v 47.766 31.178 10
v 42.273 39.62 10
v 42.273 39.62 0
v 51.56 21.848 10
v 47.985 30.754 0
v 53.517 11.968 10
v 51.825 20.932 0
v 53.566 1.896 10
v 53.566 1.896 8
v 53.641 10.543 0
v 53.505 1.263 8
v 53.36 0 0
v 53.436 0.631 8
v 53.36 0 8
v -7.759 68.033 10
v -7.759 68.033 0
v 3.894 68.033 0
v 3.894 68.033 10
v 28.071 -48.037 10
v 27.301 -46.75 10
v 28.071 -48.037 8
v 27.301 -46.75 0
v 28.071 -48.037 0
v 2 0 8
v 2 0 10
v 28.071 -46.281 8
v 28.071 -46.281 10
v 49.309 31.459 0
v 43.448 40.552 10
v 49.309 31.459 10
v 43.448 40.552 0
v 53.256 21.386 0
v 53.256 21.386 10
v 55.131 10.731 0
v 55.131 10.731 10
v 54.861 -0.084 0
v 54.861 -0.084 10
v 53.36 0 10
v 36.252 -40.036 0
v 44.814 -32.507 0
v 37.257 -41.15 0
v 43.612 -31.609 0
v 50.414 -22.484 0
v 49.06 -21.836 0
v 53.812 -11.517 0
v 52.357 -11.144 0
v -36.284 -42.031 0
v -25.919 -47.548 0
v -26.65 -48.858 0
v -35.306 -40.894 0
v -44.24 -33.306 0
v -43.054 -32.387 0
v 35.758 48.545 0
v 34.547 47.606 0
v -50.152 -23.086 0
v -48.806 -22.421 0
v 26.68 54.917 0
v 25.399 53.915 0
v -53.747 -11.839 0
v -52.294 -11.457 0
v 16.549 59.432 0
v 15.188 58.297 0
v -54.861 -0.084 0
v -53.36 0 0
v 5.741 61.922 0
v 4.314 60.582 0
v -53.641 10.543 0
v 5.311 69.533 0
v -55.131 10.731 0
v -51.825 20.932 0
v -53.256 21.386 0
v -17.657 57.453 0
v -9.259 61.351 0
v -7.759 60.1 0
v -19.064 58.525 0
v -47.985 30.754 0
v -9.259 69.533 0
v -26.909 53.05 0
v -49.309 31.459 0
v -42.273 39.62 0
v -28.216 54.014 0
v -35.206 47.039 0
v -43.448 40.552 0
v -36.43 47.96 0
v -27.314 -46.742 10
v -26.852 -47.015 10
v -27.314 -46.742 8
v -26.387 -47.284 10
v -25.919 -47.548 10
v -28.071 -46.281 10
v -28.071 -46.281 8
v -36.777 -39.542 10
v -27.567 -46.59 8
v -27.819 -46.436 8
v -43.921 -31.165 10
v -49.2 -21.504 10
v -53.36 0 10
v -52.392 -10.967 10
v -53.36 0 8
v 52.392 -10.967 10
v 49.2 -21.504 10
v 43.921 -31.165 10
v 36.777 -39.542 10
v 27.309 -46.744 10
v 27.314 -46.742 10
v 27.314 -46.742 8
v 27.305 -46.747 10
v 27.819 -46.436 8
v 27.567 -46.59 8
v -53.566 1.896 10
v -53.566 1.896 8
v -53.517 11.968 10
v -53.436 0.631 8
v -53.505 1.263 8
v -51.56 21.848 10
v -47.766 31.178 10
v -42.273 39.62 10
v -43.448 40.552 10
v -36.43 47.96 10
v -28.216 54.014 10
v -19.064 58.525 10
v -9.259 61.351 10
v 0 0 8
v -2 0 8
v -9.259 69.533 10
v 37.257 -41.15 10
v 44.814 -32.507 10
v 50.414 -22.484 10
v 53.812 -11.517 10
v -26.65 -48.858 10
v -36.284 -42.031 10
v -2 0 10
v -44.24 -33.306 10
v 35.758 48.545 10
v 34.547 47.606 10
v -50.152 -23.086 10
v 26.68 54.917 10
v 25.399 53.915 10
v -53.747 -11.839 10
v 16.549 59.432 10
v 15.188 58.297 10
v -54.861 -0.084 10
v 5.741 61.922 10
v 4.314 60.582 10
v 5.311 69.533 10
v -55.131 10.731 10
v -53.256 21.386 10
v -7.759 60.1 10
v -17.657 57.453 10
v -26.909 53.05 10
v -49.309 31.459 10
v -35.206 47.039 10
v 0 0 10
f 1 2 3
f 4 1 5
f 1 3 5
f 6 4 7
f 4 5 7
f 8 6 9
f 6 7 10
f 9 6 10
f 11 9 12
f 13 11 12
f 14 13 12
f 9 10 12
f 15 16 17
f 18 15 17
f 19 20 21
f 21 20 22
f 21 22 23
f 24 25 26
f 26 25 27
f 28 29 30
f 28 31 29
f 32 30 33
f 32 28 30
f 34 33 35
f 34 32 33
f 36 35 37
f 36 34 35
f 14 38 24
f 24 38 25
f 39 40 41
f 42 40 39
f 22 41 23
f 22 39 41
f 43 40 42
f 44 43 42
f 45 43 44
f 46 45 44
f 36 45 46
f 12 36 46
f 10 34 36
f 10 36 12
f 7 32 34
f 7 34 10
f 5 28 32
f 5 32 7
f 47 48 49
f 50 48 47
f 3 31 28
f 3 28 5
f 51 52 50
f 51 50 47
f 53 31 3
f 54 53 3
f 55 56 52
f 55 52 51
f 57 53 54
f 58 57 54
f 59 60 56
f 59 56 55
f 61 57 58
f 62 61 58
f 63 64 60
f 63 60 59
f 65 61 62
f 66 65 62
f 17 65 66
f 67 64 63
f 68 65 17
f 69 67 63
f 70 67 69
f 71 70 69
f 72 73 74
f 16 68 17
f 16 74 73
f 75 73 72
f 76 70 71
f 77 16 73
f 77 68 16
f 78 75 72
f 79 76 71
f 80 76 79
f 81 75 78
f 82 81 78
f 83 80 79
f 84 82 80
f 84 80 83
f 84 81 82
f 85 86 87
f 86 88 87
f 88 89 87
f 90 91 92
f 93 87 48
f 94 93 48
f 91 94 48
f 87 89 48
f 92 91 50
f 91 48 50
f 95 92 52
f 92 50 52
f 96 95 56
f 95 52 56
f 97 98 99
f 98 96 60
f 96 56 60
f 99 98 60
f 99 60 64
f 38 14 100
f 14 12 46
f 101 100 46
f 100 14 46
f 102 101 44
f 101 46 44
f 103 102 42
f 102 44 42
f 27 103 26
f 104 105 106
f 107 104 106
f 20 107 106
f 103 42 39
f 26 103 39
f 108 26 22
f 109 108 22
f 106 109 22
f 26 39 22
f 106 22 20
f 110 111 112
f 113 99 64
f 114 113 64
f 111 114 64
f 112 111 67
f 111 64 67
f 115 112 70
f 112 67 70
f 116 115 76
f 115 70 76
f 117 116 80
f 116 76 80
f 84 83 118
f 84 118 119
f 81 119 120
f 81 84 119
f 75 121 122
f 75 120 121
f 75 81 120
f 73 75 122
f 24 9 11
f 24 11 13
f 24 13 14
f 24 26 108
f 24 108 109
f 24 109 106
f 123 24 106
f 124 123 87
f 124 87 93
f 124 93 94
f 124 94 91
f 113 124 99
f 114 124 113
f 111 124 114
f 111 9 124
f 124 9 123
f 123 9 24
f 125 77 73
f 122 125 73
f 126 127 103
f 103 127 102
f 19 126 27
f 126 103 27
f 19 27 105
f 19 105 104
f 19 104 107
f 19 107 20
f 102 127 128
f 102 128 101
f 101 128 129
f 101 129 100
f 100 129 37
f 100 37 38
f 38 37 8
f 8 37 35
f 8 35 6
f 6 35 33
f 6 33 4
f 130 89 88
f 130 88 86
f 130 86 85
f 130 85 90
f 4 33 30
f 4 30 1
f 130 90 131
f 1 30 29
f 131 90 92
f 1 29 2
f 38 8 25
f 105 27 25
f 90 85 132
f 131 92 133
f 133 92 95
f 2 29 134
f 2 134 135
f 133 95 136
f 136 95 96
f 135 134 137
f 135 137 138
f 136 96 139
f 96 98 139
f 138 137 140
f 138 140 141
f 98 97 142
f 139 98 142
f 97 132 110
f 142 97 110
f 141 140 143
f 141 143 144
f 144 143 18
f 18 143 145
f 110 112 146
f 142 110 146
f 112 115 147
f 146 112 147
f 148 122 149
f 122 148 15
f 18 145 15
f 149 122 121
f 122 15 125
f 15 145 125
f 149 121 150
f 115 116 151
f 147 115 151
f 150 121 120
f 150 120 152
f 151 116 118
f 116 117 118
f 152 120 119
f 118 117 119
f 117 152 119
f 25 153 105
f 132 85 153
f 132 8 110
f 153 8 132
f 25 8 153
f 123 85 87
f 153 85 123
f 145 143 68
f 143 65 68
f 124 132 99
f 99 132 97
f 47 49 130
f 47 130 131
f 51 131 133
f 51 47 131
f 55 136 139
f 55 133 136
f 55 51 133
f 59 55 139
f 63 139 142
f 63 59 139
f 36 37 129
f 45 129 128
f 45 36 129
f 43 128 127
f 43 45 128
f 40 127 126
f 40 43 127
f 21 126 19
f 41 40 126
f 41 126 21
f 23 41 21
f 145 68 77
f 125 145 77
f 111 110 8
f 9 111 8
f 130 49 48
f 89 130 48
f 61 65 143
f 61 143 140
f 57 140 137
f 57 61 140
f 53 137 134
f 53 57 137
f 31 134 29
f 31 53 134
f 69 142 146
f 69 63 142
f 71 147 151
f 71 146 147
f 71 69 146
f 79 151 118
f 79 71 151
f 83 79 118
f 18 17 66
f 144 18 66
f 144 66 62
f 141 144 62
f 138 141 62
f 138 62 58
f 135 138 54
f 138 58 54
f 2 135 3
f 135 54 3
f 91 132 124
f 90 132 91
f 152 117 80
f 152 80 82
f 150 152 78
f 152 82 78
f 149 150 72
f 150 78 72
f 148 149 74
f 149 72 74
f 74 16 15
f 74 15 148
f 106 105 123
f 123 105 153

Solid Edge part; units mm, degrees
sketch "Sketch1" plane through (0, 0, 0) normal (0, 0, 1) x (1, 0, 0)
  arc A0 (-42.2727, 39.6197) -> (-53.3598, 0) centre (-0.8768, 6.6744) ccw
  arc A1 (-53.3598, 0) -> (-25.9191, -47.548) centre (0.1673, -0.8009) ccw
  line L0 (-26.65, -48.8578) -> (-25.9191, -47.548)
  arc A2 (-54.8611, -0.0838) -> (-26.65, -48.8578) centre (0.1673, -0.8009) ccw
  arc A3 (-43.4475, 40.5523) -> (-54.8611, -0.0838) centre (-0.8768, 6.6744) ccw
  arc A4 (-9.2588, 61.3508) -> (-43.4475, 40.5523) centre (1.7356, 4.7791) ccw
  line L1 (-9.2588, 69.5332) -> (-9.2588, 61.3508)
  line L2 (5.3113, 69.5332) -> (-9.2588, 69.5332)
  line L3 (5.7406, 61.9223) -> (5.3113, 69.5332)
  arc A5 (43.4475, 40.5523) -> (5.7406, 61.9223) centre (-1.7356, 4.7791) ccw
  arc A6 (54.8611, -0.0838) -> (43.4475, 40.5523) centre (0.8768, 6.6744) ccw
  arc A7 (28.0706, -48.0371) -> (54.8611, -0.0838) centre (-0.1673, -0.8009) ccw
  line L4 (27.3009, -46.7496) -> (28.0706, -48.0371)
  arc A8 (53.3598, 0) -> (27.3009, -46.7496) centre (-0.1673, -0.8009) cw
  arc A9 (42.2727, 39.6197) -> (53.3598, 0) centre (0.8768, 6.6744) cw
  arc A10 (4.3138, 60.5824) -> (42.2727, 39.6197) centre (-1.7356, 4.7791) cw
  line L5 (3.8935, 68.0332) -> (4.3138, 60.5824)
  line L6 (-7.7588, 68.0332) -> (3.8935, 68.0332)
  line L7 (-7.7588, 68.0332) -> (-7.7588, 60.1005)
  arc A11 (-7.7588, 60.1005) -> (-42.2727, 39.6197) centre (1.7356, 4.7791) ccw
extrude "Protrusion1" add sketch "Sketch1" along normal blind 10
sketch "Sketch2" plane through (0, 10.3377, 10) normal (0, 0, 1) x (0, -1, 0)
  line L0 (8.4418, -53.9965) -> (8.4418, 54.1624)
  line L1 (8.4418, 54.1624) -> (10.3377, 53.3598)
  line L2 (10.3377, 53.3598) -> (10.3377, -53.3598)
  line L3 (10.3377, -53.3598) -> (8.4418, -53.9965)
extrude "ExtrudedProtrusion_2" add sketch "Sketch2" against normal blind 2
sketch "Sketch3" plane through (0, 10.3377, 10) normal (0, 0, 1) x (0, -1, 0)
  line L0 (58.3748, 28.0706) -> (10.3377, 0)
  line L1 (10.3377, 0) -> (10.3377, 2)
  line L2 (10.3377, 2) -> (56.6184, 28.0706)
  line L3 (56.6184, 28.0706) -> (58.3748, 28.0706)
extrude "ExtrudedProtrusion_3" add sketch "Sketch3" against normal blind 2
sketch "Sketch4" plane through (0, 10.3377, 10) normal (0, 0, 1) x (0, -1, 0)
  line L0 (10.3377, -2) -> (56.6184, -28.0706)
  line L1 (56.6184, -28.0706) -> (58.3748, -28.0706)
  line L2 (58.3748, -28.0706) -> (10.3377, 0)
extrude "ExtrudedProtrusion_4" add sketch "Sketch4" against normal blind 2 material side at (-14.9917, -23.1649, 10)
